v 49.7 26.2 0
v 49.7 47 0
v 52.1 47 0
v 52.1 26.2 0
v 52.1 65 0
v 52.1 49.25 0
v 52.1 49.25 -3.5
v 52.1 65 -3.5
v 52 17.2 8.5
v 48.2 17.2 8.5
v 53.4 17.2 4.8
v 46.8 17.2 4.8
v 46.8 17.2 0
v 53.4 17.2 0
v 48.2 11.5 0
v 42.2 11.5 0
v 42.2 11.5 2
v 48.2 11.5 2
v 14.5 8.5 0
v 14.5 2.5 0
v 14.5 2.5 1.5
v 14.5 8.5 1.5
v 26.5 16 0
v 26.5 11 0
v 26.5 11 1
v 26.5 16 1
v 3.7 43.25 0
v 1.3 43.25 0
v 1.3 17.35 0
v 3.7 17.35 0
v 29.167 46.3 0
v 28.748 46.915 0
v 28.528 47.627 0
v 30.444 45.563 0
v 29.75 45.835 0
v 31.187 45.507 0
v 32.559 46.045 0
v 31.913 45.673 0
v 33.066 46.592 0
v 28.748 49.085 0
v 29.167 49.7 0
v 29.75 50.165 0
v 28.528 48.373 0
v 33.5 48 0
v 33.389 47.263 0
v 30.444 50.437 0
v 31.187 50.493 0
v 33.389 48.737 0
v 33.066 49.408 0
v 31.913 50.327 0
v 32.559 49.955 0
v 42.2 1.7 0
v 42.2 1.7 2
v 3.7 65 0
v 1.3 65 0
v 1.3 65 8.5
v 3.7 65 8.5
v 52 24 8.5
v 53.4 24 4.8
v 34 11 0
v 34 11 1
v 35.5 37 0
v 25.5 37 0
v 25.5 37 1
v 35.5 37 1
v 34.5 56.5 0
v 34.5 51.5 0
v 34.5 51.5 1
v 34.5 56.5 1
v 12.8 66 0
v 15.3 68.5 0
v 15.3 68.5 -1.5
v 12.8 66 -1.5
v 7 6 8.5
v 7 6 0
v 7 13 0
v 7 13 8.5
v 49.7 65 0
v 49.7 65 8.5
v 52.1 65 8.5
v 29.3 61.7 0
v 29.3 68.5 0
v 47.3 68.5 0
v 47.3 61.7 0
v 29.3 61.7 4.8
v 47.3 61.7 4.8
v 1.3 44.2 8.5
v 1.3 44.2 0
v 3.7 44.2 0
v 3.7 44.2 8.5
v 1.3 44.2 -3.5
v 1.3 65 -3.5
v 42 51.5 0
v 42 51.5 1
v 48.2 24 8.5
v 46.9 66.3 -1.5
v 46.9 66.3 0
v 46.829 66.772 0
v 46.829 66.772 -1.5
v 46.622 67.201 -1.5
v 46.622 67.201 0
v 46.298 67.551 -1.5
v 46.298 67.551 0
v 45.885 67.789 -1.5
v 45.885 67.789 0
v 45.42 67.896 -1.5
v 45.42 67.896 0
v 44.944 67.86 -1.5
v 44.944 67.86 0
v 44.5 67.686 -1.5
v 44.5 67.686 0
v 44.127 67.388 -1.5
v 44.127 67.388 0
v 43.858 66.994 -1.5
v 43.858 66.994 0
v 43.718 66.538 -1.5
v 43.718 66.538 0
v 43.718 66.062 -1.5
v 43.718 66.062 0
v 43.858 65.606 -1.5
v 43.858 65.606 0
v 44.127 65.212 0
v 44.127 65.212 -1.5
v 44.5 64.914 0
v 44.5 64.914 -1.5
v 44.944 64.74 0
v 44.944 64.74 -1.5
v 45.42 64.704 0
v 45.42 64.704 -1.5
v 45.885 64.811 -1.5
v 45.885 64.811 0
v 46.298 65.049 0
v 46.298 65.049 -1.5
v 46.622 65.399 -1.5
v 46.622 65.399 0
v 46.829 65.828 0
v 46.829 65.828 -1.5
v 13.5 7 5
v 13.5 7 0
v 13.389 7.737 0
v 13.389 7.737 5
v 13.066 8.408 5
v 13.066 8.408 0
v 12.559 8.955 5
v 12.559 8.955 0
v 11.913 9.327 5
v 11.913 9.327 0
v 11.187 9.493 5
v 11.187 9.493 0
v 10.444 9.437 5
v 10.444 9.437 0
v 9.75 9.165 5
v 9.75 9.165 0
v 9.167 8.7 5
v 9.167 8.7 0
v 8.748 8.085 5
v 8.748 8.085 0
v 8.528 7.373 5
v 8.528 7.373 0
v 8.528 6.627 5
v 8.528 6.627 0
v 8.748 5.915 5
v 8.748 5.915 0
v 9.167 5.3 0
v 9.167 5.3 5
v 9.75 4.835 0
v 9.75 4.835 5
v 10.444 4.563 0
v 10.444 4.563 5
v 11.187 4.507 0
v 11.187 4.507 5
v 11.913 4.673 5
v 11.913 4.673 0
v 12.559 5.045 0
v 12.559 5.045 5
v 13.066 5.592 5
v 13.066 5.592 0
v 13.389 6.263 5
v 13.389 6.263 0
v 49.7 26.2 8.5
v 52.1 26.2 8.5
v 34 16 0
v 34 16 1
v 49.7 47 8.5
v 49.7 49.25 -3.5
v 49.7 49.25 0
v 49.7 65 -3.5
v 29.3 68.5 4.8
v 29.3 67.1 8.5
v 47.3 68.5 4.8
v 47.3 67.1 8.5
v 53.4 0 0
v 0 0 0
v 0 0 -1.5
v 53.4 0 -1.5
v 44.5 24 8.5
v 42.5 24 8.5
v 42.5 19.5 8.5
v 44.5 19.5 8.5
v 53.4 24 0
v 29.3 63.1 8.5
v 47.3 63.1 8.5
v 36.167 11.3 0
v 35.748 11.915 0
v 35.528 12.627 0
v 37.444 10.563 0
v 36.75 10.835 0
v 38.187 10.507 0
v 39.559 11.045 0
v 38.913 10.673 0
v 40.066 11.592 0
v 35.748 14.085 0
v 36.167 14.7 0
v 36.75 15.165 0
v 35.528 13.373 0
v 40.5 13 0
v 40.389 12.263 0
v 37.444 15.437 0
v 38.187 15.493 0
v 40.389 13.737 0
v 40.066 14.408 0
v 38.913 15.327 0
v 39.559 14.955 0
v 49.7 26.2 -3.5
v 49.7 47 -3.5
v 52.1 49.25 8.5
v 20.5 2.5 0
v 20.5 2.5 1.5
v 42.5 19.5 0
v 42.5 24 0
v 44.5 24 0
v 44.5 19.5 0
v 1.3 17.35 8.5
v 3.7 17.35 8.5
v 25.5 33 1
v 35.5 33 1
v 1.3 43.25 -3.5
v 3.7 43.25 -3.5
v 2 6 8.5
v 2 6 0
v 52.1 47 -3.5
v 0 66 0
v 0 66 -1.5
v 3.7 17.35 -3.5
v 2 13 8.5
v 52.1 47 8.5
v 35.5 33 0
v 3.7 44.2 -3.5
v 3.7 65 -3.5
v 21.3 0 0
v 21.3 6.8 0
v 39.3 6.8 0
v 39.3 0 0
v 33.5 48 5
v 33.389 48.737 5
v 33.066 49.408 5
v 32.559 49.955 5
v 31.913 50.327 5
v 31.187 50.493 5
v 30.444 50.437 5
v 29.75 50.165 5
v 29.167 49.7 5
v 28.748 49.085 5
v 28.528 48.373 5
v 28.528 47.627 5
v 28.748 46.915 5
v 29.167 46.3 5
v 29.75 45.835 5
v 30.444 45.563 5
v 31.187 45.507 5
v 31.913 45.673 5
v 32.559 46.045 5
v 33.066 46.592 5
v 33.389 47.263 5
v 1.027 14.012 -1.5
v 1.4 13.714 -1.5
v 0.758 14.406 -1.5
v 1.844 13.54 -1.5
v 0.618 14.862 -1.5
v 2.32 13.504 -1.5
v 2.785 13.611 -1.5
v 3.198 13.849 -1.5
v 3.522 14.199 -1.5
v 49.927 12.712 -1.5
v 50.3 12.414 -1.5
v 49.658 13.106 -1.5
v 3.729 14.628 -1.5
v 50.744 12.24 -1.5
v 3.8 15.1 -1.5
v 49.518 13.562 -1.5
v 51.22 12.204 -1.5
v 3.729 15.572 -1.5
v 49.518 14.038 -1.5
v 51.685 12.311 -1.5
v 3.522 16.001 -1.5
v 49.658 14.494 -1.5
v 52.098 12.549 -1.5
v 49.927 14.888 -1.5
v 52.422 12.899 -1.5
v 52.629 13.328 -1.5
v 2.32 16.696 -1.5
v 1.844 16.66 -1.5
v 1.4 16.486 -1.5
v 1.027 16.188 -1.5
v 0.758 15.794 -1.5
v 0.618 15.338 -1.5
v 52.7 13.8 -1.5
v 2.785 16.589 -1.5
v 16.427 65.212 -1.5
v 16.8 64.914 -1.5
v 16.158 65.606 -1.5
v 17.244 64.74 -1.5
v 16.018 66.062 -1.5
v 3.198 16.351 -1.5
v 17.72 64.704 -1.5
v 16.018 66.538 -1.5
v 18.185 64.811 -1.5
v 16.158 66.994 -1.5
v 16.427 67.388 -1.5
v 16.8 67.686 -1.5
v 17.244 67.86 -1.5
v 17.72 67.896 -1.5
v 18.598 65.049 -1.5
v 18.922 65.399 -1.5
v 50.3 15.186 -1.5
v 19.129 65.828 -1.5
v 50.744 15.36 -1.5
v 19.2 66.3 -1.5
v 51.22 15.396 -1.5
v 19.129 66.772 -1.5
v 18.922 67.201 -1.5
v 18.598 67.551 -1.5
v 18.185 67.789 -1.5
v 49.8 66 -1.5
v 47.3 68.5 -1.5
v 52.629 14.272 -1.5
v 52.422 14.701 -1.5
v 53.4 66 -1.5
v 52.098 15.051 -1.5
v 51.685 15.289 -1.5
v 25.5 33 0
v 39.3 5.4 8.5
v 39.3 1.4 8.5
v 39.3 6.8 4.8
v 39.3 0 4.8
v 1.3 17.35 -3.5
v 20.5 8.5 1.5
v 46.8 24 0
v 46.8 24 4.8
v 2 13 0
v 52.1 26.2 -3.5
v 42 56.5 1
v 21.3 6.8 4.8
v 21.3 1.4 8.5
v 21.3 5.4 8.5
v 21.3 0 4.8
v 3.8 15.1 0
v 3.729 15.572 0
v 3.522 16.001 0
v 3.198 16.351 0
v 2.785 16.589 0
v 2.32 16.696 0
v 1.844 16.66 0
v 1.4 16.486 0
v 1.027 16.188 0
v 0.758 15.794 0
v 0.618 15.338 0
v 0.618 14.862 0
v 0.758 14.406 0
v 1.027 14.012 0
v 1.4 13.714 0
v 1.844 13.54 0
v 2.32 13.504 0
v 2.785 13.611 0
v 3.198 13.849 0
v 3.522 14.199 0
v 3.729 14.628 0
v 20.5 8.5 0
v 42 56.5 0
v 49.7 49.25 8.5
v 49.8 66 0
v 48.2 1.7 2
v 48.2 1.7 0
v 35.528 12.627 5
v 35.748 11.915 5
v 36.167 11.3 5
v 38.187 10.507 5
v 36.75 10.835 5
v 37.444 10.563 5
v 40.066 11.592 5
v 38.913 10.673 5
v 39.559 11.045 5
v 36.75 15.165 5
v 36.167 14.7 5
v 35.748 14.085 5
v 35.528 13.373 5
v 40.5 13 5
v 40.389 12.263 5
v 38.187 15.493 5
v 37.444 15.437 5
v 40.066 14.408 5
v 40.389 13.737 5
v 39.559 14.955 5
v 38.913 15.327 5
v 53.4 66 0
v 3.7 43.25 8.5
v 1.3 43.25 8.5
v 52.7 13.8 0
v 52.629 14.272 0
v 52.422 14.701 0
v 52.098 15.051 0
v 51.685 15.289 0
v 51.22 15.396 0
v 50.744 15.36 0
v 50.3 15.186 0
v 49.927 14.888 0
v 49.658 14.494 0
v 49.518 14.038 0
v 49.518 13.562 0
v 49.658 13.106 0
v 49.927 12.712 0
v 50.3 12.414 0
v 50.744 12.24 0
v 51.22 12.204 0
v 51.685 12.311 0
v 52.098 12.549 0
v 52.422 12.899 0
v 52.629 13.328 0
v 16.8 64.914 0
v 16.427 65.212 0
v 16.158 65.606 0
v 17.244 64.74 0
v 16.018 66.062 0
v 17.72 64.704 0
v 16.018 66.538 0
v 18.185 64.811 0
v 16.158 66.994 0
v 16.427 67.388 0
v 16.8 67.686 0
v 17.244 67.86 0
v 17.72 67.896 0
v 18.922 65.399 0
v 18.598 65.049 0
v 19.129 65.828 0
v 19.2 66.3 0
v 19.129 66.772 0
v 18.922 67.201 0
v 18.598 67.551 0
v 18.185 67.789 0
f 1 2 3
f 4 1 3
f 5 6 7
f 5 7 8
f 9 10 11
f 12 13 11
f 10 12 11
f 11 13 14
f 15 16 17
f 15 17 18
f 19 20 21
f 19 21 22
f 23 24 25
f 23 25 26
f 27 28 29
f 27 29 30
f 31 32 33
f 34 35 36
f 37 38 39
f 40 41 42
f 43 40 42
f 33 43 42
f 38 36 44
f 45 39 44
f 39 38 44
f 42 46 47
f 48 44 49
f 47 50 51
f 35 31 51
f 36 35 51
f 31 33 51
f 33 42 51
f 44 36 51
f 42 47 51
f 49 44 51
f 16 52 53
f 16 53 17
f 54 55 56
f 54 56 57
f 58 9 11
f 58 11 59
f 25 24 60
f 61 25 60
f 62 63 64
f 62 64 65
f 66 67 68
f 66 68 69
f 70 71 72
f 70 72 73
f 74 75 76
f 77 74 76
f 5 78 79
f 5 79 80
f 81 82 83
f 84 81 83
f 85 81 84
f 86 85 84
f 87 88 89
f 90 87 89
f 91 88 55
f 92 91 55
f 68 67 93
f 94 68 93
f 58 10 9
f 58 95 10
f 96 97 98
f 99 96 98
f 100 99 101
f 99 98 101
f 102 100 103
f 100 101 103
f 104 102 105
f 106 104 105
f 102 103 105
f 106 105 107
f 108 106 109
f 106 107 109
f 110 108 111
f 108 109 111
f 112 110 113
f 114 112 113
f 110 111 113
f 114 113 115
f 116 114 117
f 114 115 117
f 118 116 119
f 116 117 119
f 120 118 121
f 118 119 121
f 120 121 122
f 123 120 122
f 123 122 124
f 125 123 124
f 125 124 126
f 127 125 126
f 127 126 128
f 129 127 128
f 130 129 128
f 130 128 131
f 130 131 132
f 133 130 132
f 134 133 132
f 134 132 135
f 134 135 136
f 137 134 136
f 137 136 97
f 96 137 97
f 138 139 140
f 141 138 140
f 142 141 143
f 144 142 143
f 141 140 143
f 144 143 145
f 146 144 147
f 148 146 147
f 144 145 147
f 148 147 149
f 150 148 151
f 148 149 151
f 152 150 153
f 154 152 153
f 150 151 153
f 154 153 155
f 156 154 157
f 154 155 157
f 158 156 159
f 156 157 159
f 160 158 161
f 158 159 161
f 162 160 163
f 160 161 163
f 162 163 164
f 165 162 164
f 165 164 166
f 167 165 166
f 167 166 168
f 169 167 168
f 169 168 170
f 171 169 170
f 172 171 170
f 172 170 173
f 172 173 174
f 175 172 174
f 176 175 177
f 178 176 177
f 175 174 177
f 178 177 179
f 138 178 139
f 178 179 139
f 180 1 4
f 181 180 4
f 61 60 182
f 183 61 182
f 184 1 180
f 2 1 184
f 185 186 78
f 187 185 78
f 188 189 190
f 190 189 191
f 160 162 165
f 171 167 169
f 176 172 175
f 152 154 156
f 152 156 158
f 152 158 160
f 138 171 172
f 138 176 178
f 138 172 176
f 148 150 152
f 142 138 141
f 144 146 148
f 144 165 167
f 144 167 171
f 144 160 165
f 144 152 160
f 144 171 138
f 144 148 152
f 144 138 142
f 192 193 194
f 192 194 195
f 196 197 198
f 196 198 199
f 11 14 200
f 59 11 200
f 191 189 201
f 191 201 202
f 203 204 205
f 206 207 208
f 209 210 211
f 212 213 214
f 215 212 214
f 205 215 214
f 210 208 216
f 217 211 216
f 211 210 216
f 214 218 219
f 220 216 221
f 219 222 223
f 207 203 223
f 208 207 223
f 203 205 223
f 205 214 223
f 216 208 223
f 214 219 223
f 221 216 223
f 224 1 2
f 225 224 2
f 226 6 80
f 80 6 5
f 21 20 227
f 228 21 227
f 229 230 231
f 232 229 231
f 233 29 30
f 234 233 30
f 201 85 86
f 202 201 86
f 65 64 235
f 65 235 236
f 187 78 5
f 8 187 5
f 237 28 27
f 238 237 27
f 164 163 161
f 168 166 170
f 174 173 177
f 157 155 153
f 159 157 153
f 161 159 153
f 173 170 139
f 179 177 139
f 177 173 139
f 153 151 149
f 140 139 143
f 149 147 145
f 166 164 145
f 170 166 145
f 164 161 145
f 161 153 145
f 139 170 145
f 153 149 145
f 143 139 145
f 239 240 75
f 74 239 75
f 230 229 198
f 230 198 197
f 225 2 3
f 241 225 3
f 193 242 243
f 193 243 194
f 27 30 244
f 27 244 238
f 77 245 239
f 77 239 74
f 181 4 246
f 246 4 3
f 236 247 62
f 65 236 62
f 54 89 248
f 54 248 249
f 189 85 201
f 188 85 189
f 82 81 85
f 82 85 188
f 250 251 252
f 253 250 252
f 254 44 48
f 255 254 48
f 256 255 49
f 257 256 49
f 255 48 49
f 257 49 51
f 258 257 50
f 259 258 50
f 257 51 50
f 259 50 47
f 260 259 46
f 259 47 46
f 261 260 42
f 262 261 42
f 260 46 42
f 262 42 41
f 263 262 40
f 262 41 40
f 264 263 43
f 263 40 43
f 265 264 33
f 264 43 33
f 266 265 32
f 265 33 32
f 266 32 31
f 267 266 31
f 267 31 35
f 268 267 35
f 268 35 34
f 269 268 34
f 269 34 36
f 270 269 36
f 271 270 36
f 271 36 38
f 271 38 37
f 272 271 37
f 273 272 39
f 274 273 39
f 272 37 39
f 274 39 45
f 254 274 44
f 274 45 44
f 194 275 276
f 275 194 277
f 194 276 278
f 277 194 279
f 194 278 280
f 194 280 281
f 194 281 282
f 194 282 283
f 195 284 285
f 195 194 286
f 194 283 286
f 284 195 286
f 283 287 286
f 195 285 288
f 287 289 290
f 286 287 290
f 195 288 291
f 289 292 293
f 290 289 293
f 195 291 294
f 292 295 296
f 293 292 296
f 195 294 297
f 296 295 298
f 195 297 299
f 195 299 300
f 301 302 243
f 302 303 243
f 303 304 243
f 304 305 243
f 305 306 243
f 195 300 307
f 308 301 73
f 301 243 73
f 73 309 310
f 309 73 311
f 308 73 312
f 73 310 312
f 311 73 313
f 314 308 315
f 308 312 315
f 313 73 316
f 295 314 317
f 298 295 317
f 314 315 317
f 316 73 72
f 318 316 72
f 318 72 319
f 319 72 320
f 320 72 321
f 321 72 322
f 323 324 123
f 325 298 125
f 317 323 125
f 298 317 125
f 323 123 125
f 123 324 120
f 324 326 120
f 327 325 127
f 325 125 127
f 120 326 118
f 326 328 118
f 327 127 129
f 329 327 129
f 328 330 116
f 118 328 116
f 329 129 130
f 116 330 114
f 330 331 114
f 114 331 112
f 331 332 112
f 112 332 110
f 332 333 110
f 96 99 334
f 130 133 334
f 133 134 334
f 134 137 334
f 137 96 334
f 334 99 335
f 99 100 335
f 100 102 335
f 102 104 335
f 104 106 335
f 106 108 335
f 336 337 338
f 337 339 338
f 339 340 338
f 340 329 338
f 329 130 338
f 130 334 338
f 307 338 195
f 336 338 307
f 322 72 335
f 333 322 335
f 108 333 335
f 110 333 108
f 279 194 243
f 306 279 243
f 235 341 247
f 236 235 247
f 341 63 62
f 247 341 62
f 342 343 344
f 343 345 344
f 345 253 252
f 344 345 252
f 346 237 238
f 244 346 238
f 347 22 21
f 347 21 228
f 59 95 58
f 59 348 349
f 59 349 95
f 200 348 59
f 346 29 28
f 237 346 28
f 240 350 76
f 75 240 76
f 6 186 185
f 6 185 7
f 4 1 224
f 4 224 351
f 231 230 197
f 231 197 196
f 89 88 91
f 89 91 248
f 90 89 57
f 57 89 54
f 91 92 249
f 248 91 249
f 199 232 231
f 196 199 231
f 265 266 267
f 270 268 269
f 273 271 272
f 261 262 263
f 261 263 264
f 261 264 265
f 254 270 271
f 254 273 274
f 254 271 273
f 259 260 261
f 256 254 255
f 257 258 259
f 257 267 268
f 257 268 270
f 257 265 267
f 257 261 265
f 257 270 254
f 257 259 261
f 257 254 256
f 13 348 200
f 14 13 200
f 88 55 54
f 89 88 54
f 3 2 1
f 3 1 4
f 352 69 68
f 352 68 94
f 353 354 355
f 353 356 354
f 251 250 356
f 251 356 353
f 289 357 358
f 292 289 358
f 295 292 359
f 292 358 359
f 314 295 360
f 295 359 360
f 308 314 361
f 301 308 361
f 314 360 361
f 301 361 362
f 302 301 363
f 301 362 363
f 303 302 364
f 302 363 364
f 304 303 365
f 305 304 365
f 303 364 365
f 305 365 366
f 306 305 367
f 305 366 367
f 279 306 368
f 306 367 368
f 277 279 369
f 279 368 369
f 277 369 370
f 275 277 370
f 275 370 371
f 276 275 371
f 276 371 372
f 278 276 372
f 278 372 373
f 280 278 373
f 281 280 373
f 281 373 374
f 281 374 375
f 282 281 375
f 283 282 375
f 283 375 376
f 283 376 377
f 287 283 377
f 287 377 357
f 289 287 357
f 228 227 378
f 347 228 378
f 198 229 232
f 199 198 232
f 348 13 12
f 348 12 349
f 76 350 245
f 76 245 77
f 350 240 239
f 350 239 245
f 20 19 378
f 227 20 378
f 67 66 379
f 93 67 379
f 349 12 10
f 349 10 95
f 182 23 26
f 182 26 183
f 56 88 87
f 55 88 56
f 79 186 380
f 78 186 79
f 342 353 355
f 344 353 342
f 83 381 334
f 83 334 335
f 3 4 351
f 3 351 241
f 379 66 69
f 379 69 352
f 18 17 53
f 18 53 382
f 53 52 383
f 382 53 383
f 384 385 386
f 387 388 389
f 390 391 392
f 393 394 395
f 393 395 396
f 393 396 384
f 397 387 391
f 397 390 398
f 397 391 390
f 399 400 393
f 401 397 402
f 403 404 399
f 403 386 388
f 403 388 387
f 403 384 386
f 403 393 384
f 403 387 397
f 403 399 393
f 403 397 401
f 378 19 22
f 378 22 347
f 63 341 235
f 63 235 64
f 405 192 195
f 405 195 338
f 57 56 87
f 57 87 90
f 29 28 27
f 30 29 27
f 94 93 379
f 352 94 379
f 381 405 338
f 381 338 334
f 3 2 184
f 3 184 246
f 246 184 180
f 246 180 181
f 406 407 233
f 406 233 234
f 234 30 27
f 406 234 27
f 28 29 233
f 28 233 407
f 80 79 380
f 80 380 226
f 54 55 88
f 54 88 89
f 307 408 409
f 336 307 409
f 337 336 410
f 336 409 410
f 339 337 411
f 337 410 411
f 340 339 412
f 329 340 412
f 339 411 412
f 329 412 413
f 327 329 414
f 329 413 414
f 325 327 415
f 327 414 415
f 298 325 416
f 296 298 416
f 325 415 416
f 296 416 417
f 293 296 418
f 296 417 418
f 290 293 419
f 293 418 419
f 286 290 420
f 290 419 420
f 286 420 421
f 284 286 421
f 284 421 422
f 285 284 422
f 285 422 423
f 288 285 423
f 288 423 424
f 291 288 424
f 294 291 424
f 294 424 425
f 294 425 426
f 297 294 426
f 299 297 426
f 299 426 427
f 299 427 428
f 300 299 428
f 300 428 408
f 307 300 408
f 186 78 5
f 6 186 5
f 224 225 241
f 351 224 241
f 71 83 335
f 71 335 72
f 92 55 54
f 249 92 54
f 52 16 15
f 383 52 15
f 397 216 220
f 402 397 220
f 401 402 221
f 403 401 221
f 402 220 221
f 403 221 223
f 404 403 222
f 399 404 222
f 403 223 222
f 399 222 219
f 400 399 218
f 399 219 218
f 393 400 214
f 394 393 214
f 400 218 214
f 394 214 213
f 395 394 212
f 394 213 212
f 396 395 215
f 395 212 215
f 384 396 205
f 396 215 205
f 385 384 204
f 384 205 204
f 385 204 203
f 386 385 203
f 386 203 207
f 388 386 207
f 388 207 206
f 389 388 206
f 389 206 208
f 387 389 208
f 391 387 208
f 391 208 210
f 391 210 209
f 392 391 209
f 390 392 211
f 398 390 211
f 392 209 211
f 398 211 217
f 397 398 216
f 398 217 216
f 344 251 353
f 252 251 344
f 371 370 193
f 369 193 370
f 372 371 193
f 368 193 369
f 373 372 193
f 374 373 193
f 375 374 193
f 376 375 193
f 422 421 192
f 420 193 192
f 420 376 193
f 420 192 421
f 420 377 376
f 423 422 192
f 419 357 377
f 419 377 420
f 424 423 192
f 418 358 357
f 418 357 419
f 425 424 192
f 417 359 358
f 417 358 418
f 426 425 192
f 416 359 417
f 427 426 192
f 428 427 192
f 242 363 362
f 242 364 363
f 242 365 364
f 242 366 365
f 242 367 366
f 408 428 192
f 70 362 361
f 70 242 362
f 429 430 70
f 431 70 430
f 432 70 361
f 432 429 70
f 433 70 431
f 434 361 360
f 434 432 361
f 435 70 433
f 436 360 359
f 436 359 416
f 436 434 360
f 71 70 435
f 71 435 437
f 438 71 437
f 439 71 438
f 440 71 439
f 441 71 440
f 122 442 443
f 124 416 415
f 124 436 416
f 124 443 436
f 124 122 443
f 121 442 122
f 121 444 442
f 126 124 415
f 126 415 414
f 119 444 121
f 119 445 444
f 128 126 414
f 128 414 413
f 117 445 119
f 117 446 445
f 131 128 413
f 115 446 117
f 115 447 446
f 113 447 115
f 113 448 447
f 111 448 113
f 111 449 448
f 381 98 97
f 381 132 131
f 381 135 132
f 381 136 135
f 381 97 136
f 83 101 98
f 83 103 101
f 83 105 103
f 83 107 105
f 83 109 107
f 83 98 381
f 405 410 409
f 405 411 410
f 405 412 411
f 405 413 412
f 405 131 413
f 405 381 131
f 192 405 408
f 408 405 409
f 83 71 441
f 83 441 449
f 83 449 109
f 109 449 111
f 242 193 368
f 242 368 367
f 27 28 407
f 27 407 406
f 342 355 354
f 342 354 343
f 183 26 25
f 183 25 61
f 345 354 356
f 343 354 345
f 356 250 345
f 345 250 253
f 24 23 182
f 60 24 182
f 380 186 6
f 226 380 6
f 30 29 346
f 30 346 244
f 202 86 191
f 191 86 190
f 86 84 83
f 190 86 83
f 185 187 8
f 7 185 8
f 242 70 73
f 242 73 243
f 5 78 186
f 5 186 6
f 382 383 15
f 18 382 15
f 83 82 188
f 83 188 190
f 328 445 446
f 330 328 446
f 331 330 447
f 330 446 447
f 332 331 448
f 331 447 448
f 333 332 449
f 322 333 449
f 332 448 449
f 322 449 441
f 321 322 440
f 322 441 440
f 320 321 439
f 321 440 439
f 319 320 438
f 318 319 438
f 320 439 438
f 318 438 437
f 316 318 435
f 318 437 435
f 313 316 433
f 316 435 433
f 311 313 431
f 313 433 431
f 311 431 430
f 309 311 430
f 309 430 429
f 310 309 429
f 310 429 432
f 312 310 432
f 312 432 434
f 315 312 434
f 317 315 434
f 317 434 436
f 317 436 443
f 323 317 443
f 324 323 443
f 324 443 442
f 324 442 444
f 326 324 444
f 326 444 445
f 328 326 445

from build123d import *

# Parameters (mm, degrees)
PAD_DEPTH        = 1.5
SKETCH001_R      = 1.6
POCKET_DEPTH     = 1.501
SKETCH002_W      = 2.4
SKETCH002_H      = 25.9
PAD001_DEPTH     = 8.5
SKETCH003_W      = 2.4
SKETCH003_H      = 20.8
PAD002_DEPTH     = 8.5
SKETCH004_W      = 2.4
SKETCH004_H      = 20.8
PAD003_DEPTH     = 8.5
SKETCH005_W      = 2.4
SKETCH005_H      = 15.75
PAD004_DEPTH     = 8.5
SKETCH006_W      = 18
SKETCH006_H      = 6.8
PAD005_DEPTH     = 8.5
CHAMFER_SIZE2    = 1.4
CHAMFER_SIZE     = 3.7
CHAMFER001_SIZE2 = 3.7
CHAMFER001_SIZE  = 1.4
SKETCH007_W      = 18
SKETCH007_H      = 6.8
PAD006_DEPTH     = 8.5
CHAMFER002_SIZE2 = 1.4
CHAMFER002_SIZE  = 3.7
CHAMFER003_SIZE2 = 3.7
CHAMFER003_SIZE  = 1.4
SKETCH008_W      = 6.6
SKETCH008_H      = 6.8
PAD007_DEPTH     = 8.5
CHAMFER004_SIZE2 = 1.4
CHAMFER004_SIZE  = 3.7
CHAMFER005_SIZE2 = 3.7
CHAMFER005_SIZE  = 1.4
SKETCH009_W      = 6
SKETCH009_H      = 6
PAD008_DEPTH     = 1.5
SKETCH010_W      = 6
SKETCH010_H      = 9.8
PAD009_DEPTH     = 2
SKETCH011_W      = 7.5
SKETCH011_H      = 5
PAD010_DEPTH     = 1
SKETCH012_W      = 7.5
SKETCH012_H      = 5
PAD011_DEPTH     = 1
SKETCH013_W      = 10
SKETCH013_H      = 4
PAD012_DEPTH     = 1
SKETCH014_W      = 5
SKETCH014_H      = 7
PAD013_DEPTH     = 8.5
SKETCH015_R      = 2.5
PAD014_DEPTH     = 5
SKETCH016_R      = 2.5
PAD015_DEPTH     = 5
SKETCH017_R      = 2.5
PAD016_DEPTH     = 5
SKETCH018_W      = 2
SKETCH018_H      = 4.5
PAD017_DEPTH     = 8.5
SKETCH019_W      = 2.4
SKETCH019_H      = 25.9
PAD018_DEPTH     = 3.5
SKETCH020_W      = 2.4
SKETCH020_H      = 20.8
PAD019_DEPTH     = 3.5
SKETCH021_W      = 2.4
SKETCH021_H      = 20.8
PAD020_DEPTH     = 3.5
SKETCH022_W      = 2.4
SKETCH022_H      = 15.75
PAD021_DEPTH     = 3.5


with BuildPart() as mainboard:
    # Sketch → Pad (new body)
    with BuildSketch(Plane.XY):
        Polygon((0, 0), (53.4, 0), (53.4, 66), (49.8, 66), (47.3, 68.5), (15.3, 68.5), (12.8, 66), (0, 66), align=None)
    extrude(amount=-PAD_DEPTH)

    # Sketch001 → Pocket (cut, through all)
    with BuildSketch(Plane.XY):
        with Locations((2.2, 15.1)):
            Circle(SKETCH001_R)
        with Locations((51.1, 13.8)):
            Circle(SKETCH001_R)
        with Locations((17.6, 66.3)):
            Circle(SKETCH001_R)
        with Locations((45.3, 66.3)):
            Circle(SKETCH001_R)
    extrude(amount=-POCKET_DEPTH, mode=Mode.SUBTRACT)


with BuildPart() as header1_10pin:
    # Sketch002 → Pad001 (new body)
    with BuildSketch(Plane.XY):
        with Locations((2.5, 30.3)):
            Rectangle(SKETCH002_W, SKETCH002_H)
    extrude(amount=PAD001_DEPTH)


with BuildPart() as header2_8pin:
    # Sketch003 → Pad002 (new body)
    with BuildSketch(Plane.XY):
        with Locations((2.5, 54.6)):
            Rectangle(SKETCH003_W, SKETCH003_H)
    extrude(amount=PAD002_DEPTH)


with BuildPart() as header3_8pin:
    # Sketch004 → Pad003 (new body)
    with BuildSketch(Plane.XY):
        with Locations((50.9, 36.6)):
            Rectangle(SKETCH004_W, SKETCH004_H)
    extrude(amount=PAD003_DEPTH)


with BuildPart() as header4_6pin:
    # Sketch005 → Pad004 (new body)
    with BuildSketch(Plane.XY):
        with Locations((50.9, 57.125)):
            Rectangle(SKETCH005_W, SKETCH005_H)
    extrude(amount=PAD004_DEPTH)


with BuildPart() as m1m2header:
    # Sketch006 → Pad005 (new body)
    with BuildSketch(Plane.XY):
        with Locations((30.3, 3.4)):
            Rectangle(SKETCH006_W, SKETCH006_H)
    extrude(amount=PAD005_DEPTH)

    # Chamfer
    chamfer_edges = [m1m2header.edges().sort_by_distance(p)[0] for p in [
        (30.3, 0, 8.5),
    ]]
    chamfer_side = m1m2header.faces().sort_by_distance((30.3, 0, 4.25))[0]
    chamfer(chamfer_edges, length=CHAMFER_SIZE, length2=CHAMFER_SIZE2, reference=chamfer_side)

    # Chamfer001
    chamfer001_edges = [m1m2header.edges().sort_by_distance(p)[0] for p in [
        (30.3, 6.8, 8.5),
    ]]
    chamfer001_side = m1m2header.faces().sort_by_distance((30.3, 4.1, 8.5))[0]
    chamfer(chamfer001_edges, length=CHAMFER001_SIZE, length2=CHAMFER001_SIZE2, reference=chamfer001_side)


with BuildPart() as m3m4header:
    # Sketch007 → Pad006 (new body)
    with BuildSketch(Plane.XY):
        with Locations((38.3, 65.1)):
            Rectangle(SKETCH007_W, SKETCH007_H)
    extrude(amount=PAD006_DEPTH)

    # Chamfer002
    chamfer002_edges = [m3m4header.edges().sort_by_distance(p)[0] for p in [
        (38.3, 68.5, 8.5),
    ]]
    chamfer002_side = m3m4header.faces().sort_by_distance((38.3, 68.5, 4.25))[0]
    chamfer(chamfer002_edges, length=CHAMFER002_SIZE, length2=CHAMFER002_SIZE2, reference=chamfer002_side)

    # Chamfer003
    chamfer003_edges = [m3m4header.edges().sort_by_distance(p)[0] for p in [
        (38.3, 61.7, 8.5),
    ]]
    chamfer003_side = m3m4header.faces().sort_by_distance((38.3, 64.4, 8.5))[0]
    chamfer(chamfer003_edges, length=CHAMFER003_SIZE, length2=CHAMFER003_SIZE2, reference=chamfer003_side)


with BuildPart() as powerheader:
    # Sketch008 → Pad007 (new body)
    with BuildSketch(Plane.XY):
        with Locations((50.1, 20.6)):
            Rectangle(SKETCH008_W, SKETCH008_H)
    extrude(amount=PAD007_DEPTH)

    # Chamfer004
    chamfer004_edges = [powerheader.edges().sort_by_distance(p)[0] for p in [
        (53.4, 20.6, 8.5),
    ]]
    chamfer004_side = powerheader.faces().sort_by_distance((53.4, 20.6, 4.25))[0]
    chamfer(chamfer004_edges, length=CHAMFER004_SIZE, length2=CHAMFER004_SIZE2, reference=chamfer004_side)

    # Chamfer005
    chamfer005_edges = [powerheader.edges().sort_by_distance(p)[0] for p in [
        (46.8, 20.6, 8.5),
    ]]
    chamfer005_side = powerheader.faces().sort_by_distance((49.4, 20.6, 8.5))[0]
    chamfer(chamfer005_edges, length=CHAMFER005_SIZE, length2=CHAMFER005_SIZE2, reference=chamfer005_side)


with BuildPart() as resetbutton:
    # Sketch009 → Pad008 (new body)
    with BuildSketch(Plane.XY):
        with Locations((17.5, 5.5)):
            Rectangle(SKETCH009_W, SKETCH009_H)
    extrude(amount=PAD008_DEPTH)


with BuildPart() as fet:
    # Sketch010 → Pad009 (new body)
    with BuildSketch(Plane.XY):
        with Locations((45.2, 6.6)):
            Rectangle(SKETCH010_W, SKETCH010_H)
    extrude(amount=PAD009_DEPTH)


with BuildPart() as hbridge1:
    # Sketch011 → Pad010 (new body)
    with BuildSketch(Plane.XY):
        with Locations((38.25, 54)):
            Rectangle(SKETCH011_W, SKETCH011_H)
    extrude(amount=PAD010_DEPTH)


with BuildPart() as hbridge2:
    # Sketch012 → Pad011 (new body)
    with BuildSketch(Plane.XY):
        with Locations((30.25, 13.5)):
            Rectangle(SKETCH012_W, SKETCH012_H)
    extrude(amount=PAD011_DEPTH)


with BuildPart() as chip:
    # Sketch013 → Pad012 (new body)
    with BuildSketch(Plane.XY):
        with Locations((30.5, 35)):
            Rectangle(SKETCH013_W, SKETCH013_H)
    extrude(amount=PAD012_DEPTH)


with BuildPart() as servopins:
    # Sketch014 → Pad013 (new body)
    with BuildSketch(Plane.XY):
        with Locations((4.5, 9.5)):
            Rectangle(SKETCH014_W, SKETCH014_H)
    extrude(amount=PAD013_DEPTH)


with BuildPart() as cap1:
    # Sketch015 → Pad014 (new body)
    with BuildSketch(Plane.XY):
        with Locations((11, 7)):
            Circle(SKETCH015_R)
    extrude(amount=PAD014_DEPTH)


with BuildPart() as cap2:
    # Sketch016 → Pad015 (new body)
    with BuildSketch(Plane.XY):
        with Locations((38, 13)):
            Circle(SKETCH016_R)
    extrude(amount=PAD015_DEPTH)


with BuildPart() as cap3:
    # Sketch017 → Pad016 (new body)
    with BuildSketch(Plane.XY):
        with Locations((31, 48)):
            Circle(SKETCH017_R)
    extrude(amount=PAD016_DEPTH)


with BuildPart() as powerjumper:
    # Sketch018 → Pad017 (new body)
    with BuildSketch(Plane.XY):
        with Locations((43.5, 21.75)):
            Rectangle(SKETCH018_W, SKETCH018_H)
    extrude(amount=PAD017_DEPTH)


with BuildPart() as pins1:
    # Sketch019 → Pad018 (new body)
    with BuildSketch(Plane.XY):
        with Locations((2.5, 30.3)):
            Rectangle(SKETCH019_W, SKETCH019_H)
    extrude(amount=-PAD018_DEPTH)


with BuildPart() as pins2:
    # Sketch020 → Pad019 (new body)
    with BuildSketch(Plane.XY):
        with Locations((2.5, 54.6)):
            Rectangle(SKETCH020_W, SKETCH020_H)
    extrude(amount=-PAD019_DEPTH)


with BuildPart() as pins3:
    # Sketch021 → Pad020 (new body)
    with BuildSketch(Plane.XY):
        with Locations((50.9, 36.6)):
            Rectangle(SKETCH021_W, SKETCH021_H)
    extrude(amount=-PAD020_DEPTH)


with BuildPart() as pin4:
    # Sketch022 → Pad021 (new body)
    with BuildSketch(Plane.XY):
        with Locations((50.9, 57.125)):
            Rectangle(SKETCH022_W, SKETCH022_H)
    extrude(amount=-PAD021_DEPTH)


solid = Compound([mainboard.part, header1_10pin.part, header2_8pin.part, header3_8pin.part, header4_6pin.part, m1m2header.part, m3m4header.part, powerheader.part, resetbutton.part, fet.part, hbridge1.part, hbridge2.part, chip.part, servopins.part, cap1.part, cap2.part, cap3.part, powerjumper.part, pins1.part, pins2.part, pins3.part, pin4.part])
